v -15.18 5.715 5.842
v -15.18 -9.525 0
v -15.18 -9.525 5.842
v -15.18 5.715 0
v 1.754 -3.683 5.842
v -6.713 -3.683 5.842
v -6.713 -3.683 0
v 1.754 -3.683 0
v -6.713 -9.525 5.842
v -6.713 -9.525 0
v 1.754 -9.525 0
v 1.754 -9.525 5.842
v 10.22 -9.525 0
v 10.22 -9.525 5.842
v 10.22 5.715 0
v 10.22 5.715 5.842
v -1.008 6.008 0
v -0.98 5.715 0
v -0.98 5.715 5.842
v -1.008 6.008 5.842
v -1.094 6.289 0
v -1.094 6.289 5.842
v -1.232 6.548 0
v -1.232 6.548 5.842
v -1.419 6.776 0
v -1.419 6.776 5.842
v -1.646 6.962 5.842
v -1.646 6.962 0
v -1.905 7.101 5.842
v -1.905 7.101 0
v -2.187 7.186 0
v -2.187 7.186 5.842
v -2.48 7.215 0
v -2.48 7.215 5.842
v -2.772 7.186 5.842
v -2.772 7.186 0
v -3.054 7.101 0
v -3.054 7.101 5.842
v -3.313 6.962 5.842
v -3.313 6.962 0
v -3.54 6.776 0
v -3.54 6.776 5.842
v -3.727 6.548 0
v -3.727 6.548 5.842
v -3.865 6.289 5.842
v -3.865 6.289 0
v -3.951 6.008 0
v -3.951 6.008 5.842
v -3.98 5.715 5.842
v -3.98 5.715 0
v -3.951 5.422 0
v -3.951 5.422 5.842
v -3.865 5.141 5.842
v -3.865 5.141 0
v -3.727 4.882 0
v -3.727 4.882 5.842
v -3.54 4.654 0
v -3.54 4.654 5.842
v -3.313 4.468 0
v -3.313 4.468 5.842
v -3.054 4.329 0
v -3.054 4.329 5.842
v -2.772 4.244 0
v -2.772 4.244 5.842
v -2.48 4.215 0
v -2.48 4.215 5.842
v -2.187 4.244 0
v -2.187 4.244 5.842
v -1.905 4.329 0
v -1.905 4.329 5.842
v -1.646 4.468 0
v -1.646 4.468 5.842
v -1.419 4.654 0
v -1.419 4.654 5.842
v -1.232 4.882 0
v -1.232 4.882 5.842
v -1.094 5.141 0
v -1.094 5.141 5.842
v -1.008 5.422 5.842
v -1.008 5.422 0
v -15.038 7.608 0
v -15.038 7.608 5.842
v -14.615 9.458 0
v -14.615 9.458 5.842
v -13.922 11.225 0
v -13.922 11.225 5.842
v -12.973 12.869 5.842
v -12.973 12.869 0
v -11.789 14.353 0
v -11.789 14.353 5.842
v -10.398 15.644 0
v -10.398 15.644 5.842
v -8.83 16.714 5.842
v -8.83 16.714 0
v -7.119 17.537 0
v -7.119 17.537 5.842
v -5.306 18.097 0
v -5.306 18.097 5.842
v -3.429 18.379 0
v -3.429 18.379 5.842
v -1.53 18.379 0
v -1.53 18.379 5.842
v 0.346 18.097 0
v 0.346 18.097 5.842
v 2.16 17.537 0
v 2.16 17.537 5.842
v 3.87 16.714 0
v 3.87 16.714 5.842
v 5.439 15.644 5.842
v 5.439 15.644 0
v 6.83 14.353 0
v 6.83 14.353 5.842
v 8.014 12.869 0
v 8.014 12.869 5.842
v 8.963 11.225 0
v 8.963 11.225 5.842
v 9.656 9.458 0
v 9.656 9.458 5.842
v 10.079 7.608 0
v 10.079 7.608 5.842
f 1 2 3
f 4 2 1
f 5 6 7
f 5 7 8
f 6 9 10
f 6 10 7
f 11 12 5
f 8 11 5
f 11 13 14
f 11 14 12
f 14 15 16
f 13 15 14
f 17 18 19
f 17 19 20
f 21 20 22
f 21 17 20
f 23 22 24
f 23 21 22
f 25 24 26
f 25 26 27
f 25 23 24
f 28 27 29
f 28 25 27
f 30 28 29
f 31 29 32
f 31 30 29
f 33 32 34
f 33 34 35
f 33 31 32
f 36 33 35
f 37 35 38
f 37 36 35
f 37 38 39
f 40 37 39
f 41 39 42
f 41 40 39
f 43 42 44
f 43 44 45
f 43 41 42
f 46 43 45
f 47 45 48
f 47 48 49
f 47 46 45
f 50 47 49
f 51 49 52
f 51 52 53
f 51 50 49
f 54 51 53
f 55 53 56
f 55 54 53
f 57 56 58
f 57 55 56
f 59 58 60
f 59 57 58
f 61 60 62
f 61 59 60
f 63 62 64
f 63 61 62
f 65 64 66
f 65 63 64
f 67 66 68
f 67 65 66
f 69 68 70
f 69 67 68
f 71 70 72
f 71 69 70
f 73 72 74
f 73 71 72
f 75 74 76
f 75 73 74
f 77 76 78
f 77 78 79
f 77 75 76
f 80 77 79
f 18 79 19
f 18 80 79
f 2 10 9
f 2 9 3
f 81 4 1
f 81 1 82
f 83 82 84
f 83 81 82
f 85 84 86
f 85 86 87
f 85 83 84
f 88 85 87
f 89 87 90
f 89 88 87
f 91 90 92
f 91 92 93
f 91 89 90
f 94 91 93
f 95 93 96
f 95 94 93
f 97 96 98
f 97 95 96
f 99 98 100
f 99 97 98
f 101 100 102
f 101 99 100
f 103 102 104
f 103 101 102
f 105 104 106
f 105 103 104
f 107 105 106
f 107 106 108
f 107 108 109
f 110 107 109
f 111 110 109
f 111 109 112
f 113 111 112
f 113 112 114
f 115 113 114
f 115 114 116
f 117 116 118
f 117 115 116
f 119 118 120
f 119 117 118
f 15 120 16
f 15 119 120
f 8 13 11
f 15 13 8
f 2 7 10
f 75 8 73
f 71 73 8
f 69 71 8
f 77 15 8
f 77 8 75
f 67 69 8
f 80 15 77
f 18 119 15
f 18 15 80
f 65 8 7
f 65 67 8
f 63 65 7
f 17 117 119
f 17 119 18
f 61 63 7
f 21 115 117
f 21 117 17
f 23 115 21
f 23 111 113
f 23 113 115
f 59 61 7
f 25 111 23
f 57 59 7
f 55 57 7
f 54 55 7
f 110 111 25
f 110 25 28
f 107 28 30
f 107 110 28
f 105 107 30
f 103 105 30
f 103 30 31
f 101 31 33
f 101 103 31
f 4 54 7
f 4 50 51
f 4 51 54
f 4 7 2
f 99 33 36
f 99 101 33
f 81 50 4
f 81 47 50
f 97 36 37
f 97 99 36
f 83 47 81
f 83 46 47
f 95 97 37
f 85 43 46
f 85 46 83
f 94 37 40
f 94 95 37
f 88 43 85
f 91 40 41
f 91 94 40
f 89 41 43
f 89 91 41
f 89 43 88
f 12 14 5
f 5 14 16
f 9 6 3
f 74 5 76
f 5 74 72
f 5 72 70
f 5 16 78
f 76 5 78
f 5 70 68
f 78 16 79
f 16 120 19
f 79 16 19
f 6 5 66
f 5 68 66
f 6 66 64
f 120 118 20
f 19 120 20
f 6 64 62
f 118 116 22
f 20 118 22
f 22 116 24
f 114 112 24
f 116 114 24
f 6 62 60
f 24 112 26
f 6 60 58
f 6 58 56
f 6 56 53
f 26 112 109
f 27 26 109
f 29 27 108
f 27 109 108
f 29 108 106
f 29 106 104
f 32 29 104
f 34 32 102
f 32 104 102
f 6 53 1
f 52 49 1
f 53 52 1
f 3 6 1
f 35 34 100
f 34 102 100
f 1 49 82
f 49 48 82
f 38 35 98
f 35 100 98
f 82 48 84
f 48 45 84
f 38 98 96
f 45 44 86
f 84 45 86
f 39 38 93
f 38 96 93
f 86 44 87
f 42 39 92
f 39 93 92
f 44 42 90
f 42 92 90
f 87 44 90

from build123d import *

# Parameters (mm, degrees)
SKETCH1_R           = 1.5
BOSS_EXTRUDE1_DEPTH = 5.842
SKETCH3_W           = 8.466666667
SKETCH3_H           = 5.842
CUT_EXTRUDE2_DEPTH  = 5.842


with BuildPart() as part:
    # Sketch1 → Boss-Extrude1 (new body)
    with BuildSketch(Plane.XY):
        with BuildLine():
            Line((10.22047619, -9.525), (-15.17952381, -9.525))
            Line((-15.17952381, -9.525), (-15.17952381, 5.715))
            ThreePointArc((-15.17952381, 5.715), (-2.47952381, 18.415), (10.22047619, 5.715))
            Line((10.22047619, 5.715), (10.22047619, -9.525))
        make_face()
        with Locations((-2.47952381, 5.715)):
            Circle(SKETCH1_R, mode=Mode.SUBTRACT)
    extrude(amount=BOSS_EXTRUDE1_DEPTH)

    # Sketch3 → Cut-Extrude2 (cut)
    with BuildSketch(Plane.XY.offset(5.842)):
        with Locations((-2.47952381, -6.604)):
            Rectangle(SKETCH3_W, SKETCH3_H)
    extrude(amount=-CUT_EXTRUDE2_DEPTH, mode=Mode.SUBTRACT)


solid = part.part
